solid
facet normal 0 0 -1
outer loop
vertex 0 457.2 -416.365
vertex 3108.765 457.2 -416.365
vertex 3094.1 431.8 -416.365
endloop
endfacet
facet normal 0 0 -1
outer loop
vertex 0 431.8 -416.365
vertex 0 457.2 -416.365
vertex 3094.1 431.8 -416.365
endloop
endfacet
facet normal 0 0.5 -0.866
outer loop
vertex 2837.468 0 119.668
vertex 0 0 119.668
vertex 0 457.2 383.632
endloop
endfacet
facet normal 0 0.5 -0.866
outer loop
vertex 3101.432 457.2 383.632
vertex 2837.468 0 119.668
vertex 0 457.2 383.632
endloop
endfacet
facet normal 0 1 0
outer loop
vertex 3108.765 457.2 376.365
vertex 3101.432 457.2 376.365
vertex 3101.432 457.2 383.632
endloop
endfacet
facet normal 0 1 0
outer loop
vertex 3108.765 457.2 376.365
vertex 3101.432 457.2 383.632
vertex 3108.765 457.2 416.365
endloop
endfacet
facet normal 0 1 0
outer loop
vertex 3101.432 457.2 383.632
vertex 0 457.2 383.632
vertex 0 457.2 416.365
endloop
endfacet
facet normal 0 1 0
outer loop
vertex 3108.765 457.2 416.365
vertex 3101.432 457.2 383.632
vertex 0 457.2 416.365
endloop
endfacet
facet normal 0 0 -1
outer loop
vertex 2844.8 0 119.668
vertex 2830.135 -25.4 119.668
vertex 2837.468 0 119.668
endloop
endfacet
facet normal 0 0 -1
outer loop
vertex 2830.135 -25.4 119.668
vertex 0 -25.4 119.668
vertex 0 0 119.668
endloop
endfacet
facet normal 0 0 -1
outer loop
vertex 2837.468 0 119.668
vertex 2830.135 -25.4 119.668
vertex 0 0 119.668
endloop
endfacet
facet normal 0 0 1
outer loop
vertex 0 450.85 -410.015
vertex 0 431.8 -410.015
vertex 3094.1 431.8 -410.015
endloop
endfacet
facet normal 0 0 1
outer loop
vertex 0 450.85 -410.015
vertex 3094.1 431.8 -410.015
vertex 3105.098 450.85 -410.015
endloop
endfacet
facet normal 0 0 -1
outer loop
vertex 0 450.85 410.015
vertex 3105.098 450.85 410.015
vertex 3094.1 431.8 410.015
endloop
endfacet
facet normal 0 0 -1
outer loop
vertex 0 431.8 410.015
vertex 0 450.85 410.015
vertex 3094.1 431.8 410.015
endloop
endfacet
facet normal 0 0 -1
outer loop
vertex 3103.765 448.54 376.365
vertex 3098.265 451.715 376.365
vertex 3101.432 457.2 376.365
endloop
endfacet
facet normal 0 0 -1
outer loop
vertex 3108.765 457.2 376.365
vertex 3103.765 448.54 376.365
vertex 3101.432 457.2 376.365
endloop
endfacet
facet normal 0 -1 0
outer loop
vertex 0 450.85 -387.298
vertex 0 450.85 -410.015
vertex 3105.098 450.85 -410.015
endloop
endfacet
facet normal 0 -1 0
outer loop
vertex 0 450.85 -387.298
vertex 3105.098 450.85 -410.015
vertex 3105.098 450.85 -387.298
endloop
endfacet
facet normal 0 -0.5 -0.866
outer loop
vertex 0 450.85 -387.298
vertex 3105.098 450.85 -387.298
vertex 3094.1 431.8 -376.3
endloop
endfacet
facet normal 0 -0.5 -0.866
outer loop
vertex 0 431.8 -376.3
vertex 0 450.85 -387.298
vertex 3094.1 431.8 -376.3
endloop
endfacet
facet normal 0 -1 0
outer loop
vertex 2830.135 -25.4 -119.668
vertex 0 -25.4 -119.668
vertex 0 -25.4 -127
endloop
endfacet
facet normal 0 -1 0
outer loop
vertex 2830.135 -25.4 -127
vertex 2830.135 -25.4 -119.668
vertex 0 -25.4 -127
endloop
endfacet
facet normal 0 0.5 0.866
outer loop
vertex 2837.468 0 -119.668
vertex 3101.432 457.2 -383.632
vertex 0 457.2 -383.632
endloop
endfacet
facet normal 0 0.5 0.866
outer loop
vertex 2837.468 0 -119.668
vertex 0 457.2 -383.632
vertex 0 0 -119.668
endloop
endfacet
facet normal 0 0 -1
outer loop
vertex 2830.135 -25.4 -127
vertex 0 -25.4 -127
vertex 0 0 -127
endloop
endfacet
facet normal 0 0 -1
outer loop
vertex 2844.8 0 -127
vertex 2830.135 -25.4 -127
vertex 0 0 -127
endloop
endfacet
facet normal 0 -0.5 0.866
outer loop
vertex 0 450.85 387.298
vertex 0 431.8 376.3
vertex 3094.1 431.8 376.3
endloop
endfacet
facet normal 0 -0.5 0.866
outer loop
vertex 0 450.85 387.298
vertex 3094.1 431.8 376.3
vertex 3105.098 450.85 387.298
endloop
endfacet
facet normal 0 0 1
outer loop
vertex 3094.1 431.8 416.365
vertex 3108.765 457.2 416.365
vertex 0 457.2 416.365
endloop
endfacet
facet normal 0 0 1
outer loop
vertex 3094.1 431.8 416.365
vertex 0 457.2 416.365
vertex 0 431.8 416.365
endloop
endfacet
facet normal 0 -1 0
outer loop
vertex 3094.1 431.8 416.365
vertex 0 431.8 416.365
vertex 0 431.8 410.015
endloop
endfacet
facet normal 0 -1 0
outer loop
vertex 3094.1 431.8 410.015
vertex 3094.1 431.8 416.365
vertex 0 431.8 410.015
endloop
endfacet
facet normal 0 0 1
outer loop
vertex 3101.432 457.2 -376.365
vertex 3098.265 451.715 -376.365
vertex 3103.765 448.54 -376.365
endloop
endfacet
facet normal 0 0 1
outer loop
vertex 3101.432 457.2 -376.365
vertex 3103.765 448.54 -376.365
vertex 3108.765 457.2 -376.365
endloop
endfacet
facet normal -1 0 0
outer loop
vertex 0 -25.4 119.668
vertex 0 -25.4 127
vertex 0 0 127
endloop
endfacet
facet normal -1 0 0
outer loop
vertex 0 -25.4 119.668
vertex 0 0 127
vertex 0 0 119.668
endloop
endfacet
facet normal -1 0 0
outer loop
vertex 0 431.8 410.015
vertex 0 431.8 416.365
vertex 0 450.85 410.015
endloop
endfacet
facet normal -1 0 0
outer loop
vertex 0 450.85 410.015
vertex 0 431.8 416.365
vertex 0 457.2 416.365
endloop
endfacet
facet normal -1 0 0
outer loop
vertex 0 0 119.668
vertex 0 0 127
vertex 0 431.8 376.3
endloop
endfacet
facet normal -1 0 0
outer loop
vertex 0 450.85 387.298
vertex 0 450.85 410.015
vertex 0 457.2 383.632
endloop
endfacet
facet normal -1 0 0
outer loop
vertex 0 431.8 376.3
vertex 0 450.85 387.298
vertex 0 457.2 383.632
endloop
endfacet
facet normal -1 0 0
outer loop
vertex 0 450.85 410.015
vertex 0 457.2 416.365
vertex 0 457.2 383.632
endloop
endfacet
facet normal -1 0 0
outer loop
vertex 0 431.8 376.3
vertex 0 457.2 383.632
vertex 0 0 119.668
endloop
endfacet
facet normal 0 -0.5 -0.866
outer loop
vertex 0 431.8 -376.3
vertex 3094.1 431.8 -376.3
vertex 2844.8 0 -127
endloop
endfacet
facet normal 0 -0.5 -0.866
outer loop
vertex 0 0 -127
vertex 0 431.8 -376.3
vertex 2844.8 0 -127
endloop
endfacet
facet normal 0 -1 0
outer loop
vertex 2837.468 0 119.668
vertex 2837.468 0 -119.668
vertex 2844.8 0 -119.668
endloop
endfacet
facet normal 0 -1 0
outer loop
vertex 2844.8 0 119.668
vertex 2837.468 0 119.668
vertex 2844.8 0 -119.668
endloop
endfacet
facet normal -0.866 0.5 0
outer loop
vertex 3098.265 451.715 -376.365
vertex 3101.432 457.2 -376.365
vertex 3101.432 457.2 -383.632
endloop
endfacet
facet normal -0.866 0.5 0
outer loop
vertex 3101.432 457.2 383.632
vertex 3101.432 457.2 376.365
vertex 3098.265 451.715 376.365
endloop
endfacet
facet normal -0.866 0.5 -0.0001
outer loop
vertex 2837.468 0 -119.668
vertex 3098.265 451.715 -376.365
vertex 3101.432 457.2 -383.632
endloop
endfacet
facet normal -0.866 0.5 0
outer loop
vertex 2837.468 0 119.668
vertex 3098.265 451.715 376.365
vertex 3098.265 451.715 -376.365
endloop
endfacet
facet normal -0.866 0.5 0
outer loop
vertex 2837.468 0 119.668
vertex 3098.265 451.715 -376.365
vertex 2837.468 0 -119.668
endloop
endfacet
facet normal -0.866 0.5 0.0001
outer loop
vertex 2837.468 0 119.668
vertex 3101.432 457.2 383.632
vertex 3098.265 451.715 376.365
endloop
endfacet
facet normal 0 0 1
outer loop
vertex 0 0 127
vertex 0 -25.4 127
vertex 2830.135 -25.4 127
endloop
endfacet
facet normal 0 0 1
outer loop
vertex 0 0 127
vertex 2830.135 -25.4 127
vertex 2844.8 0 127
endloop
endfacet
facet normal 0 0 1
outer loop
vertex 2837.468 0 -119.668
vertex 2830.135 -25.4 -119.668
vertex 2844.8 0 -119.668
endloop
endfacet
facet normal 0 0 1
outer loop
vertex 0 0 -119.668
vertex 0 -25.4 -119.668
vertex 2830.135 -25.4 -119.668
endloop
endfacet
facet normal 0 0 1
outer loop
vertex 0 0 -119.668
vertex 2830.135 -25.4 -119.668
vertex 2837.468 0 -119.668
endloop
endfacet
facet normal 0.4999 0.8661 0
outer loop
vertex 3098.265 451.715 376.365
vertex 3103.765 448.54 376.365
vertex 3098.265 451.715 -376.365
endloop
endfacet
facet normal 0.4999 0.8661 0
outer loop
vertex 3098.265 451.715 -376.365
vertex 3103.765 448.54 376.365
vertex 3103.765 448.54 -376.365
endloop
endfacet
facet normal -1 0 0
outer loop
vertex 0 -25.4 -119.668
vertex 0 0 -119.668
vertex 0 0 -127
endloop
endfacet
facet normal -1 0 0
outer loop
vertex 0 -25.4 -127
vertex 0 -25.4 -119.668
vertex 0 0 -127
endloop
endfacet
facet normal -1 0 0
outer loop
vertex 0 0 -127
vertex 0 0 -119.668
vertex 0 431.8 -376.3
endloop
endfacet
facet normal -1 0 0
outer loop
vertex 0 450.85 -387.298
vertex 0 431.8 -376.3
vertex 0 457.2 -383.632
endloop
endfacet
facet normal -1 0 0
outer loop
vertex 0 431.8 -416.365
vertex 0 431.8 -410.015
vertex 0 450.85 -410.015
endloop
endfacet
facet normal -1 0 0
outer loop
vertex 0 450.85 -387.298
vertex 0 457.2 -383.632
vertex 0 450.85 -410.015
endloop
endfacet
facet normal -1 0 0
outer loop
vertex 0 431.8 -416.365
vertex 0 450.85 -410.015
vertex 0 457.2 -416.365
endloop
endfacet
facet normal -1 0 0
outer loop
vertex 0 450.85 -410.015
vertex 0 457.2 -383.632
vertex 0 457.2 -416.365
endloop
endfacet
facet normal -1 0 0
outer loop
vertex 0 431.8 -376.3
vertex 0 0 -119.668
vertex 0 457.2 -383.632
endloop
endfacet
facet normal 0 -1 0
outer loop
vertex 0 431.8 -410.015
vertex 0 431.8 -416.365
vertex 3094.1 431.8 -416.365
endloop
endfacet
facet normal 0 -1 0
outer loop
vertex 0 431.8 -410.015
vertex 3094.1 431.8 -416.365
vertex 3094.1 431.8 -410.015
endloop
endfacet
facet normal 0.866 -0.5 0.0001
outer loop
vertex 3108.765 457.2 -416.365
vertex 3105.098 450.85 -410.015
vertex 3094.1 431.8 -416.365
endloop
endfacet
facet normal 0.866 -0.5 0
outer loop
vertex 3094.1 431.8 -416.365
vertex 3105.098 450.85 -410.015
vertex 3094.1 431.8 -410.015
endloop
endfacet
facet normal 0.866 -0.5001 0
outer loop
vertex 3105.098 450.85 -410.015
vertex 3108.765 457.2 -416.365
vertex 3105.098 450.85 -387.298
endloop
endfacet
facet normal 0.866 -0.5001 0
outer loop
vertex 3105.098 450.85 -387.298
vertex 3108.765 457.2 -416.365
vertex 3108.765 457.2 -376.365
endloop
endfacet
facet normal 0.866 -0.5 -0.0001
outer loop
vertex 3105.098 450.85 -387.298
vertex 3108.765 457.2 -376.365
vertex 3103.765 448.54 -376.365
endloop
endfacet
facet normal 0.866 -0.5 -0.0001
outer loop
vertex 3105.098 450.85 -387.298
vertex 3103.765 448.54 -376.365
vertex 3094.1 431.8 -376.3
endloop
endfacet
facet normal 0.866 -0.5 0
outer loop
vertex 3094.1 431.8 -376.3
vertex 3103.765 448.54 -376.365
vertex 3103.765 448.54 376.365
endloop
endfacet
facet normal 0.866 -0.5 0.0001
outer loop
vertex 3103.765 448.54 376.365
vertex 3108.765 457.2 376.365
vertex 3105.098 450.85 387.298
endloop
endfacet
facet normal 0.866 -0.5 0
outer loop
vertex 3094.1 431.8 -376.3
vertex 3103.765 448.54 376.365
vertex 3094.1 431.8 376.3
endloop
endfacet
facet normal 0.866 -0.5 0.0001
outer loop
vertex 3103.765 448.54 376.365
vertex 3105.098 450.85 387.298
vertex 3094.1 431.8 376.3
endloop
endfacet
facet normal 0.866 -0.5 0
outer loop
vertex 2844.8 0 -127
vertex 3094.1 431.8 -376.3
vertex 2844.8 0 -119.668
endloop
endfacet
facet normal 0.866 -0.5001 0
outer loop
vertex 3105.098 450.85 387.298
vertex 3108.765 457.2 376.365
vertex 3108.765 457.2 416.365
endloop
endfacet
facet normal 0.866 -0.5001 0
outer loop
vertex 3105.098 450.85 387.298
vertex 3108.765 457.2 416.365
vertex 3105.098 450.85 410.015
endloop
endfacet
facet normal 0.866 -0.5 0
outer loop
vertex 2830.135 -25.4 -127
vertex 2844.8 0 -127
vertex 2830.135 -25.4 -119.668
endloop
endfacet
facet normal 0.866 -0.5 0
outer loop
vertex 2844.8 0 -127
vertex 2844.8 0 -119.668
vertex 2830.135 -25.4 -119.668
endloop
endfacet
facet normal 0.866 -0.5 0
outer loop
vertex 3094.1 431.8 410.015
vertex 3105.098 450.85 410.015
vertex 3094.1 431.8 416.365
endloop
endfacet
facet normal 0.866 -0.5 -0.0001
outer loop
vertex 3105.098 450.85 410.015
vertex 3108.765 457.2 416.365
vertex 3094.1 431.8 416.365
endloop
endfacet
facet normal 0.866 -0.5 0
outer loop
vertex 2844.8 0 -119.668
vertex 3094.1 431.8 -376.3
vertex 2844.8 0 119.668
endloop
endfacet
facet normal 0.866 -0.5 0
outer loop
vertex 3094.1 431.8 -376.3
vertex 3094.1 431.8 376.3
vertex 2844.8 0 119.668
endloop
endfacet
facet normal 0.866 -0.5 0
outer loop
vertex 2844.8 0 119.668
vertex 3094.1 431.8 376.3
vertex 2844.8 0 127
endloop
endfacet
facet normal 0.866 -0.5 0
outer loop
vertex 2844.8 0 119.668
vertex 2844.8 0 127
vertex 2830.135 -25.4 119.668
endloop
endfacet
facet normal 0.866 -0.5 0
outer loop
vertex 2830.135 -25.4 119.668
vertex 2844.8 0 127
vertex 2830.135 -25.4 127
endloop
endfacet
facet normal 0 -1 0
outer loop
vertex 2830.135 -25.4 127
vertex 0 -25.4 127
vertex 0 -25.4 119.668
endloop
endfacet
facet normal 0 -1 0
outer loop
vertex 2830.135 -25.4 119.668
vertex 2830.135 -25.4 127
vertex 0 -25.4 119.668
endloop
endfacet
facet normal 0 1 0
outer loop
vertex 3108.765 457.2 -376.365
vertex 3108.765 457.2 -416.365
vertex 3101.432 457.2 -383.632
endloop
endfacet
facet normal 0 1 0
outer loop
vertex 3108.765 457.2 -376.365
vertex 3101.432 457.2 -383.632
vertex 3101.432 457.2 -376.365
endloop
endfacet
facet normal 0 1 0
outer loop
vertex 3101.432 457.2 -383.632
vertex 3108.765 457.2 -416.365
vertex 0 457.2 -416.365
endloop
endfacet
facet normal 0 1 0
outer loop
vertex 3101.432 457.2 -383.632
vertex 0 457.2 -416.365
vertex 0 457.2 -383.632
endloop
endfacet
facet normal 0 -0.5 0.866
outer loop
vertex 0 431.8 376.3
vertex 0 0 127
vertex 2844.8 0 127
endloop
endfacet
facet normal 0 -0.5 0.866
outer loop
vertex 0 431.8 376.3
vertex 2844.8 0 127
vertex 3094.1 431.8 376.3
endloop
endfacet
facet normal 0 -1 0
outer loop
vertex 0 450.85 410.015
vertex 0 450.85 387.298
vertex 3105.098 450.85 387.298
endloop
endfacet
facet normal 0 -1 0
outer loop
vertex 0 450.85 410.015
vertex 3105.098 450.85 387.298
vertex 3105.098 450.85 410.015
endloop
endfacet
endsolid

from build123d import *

# Parameters (mm, degrees)
CHUTE_CENTER_DEPTH         = 127
CHUTE_SIDES_REACH          = 3146.77
SHELL1_T                   = -6.35
BOSS_EXTRUDE3_REACH        = 3168.434
SHELL3_DEPTH               = 3105.098368864
BOSS_EXTRUDE4_REACH        = 3171.67
SHELL5_DEPTH               = 3105.098368864
SKETCH11_W                 = 752.729086146
SKETCH11_H                 = 10
CLOSED_END_RELIEF_DEPTH    = 10
LOWER_SUPPORT_FLANGE_REACH = 3171.67
SKETCH12_W                 = 7.332348419
SKETCH12_H                 = 25.4


# Read off the part's stored shape, not the designer's step: Shell3, Shell5
with BuildPart() as part:
    # Sketch1 → Chute Center (new, symmetric)
    with BuildSketch(Plane.XY):
        Polygon((0, 0), (2844.8, 0), (3108.764543073, 457.2), (0, 457.2), align=None)
    extrude(amount=CHUTE_CENTER_DEPTH, both=True)

    # Chute Sides: up to this plane
    chute_sides_end = Plane(origin=(2844.8, 0, 127), z_dir=(-0.8660254037844399, 0.49999999999999784, 0))
    # Sketch2 → Chute Sides (add, up to the surface)
    with BuildSketch(Plane.ZY, mode=Mode.PRIVATE) as chute_sides_sk1:
        Polygon((127, 0), (390.964543073, 457.2), (127, 457.2), align=None)
    chute_sides_tool1 = split(extrude(chute_sides_sk1.sketch, amount=-CHUTE_SIDES_REACH, mode=Mode.PRIVATE), bisect_by=chute_sides_end, keep=Keep.BOTH, mode=Mode.PRIVATE)
    add(chute_sides_tool1.solids().sort_by_distance((0, 304.8, 214.988181))[0])
    # Sketch2 → Chute Sides (add, up to the surface)
    with BuildSketch(Plane.ZY, mode=Mode.PRIVATE) as chute_sides_sk2:
        Polygon((-127, 457.2), (-390.964543073, 457.2), (-127, 0), align=None)
    chute_sides_tool2 = split(extrude(chute_sides_sk2.sketch, amount=-CHUTE_SIDES_REACH, mode=Mode.PRIVATE), bisect_by=chute_sides_end, keep=Keep.BOTH, mode=Mode.PRIVATE)
    add(chute_sides_tool2.solids().sort_by_distance((0, 304.8, -214.988181))[0])

    # Shell1
    shell1_openings = [part.faces().sort_by_distance(p)[0] for p in [
        (1554.382271537, 457.2, 0),
        (1422.4, 0, 0),
        (0, 267.432963474, 0),
    ]]
    offset(amount=SHELL1_T, openings=shell1_openings, kind=Kind.INTERSECTION)

    # Boss-Extrude3: up to this plane
    boss_extrude3_end = Plane(origin=(2844.8, 0, 127), z_dir=(-0.8660254037844399, 0.49999999999999784, 0))
    # Sketch6 → Boss-Extrude3 (add, up to the surface)
    with BuildSketch(Plane(origin=(0, 0, 0), x_dir=(0, 0, -1), z_dir=(1, 0, 0)), mode=Mode.PRIVATE) as boss_extrude3_sk1:
        Polygon((390.964543073, 457.2), (416.364543073, 457.2), (416.364543073, 431.8), (376.299846236, 431.8), align=None)
    boss_extrude3_tool1 = split(extrude(boss_extrude3_sk1.sketch, amount=BOSS_EXTRUDE3_REACH, mode=Mode.PRIVATE), bisect_by=boss_extrude3_end, keep=Keep.BOTH, mode=Mode.PRIVATE)
    add(boss_extrude3_tool1.solids().sort_by_distance((0, 443.551694, -399.724617))[0])

    # Shell3 outline → Shell3 (cut)
    with BuildSketch(Plane.YZ):
        Polygon((450.85, -410.014543073), (450.85, -387.298368864), (431.8, -376.299846236), (431.8, -410.014543073), align=None)
    extrude(amount=SHELL3_DEPTH, mode=Mode.SUBTRACT)

    # Boss-Extrude4: up to this plane
    boss_extrude4_end = Plane(origin=(2844.8, 0, 127), z_dir=(-0.8660254037844399, 0.49999999999999784, 0))
    # Sketch7 → Boss-Extrude4 (add, up to the surface)
    with BuildSketch(Plane(origin=(0, 0, 0), x_dir=(0, 0, -1), z_dir=(1, 0, 0)), mode=Mode.PRIVATE) as boss_extrude4_sk1:
        Polygon((-390.964543073, 457.2), (-416.364543073, 457.2), (-416.364543073, 431.8), (-376.299846236, 431.8), align=None)
    boss_extrude4_tool1 = split(extrude(boss_extrude4_sk1.sketch, amount=BOSS_EXTRUDE4_REACH, mode=Mode.PRIVATE), bisect_by=boss_extrude4_end, keep=Keep.BOTH, mode=Mode.PRIVATE)
    add(boss_extrude4_tool1.solids().sort_by_distance((0, 443.551694, 399.724617))[0])

    # Shell5 outline → Shell5 (cut)
    with BuildSketch(Plane.YZ):
        Polygon((450.85, 387.298368864), (450.85, 410.014543073), (431.8, 410.014543073), (431.8, 376.299846236), align=None)
    extrude(amount=SHELL5_DEPTH, mode=Mode.SUBTRACT)

    # Sketch11 → Closed End Relief (cut)
    with BuildSketch(Plane(origin=(2133.6, -1231.834534343, 0), x_dir=(0, 0, -1), z_dir=(0.86602540378444, -0.49999999999999784, 0))):
        with Locations((0, 1945.329086147)):
            Rectangle(SKETCH11_W, SKETCH11_H)
    extrude(amount=-CLOSED_END_RELIEF_DEPTH, mode=Mode.SUBTRACT)

    # Lower Support Flange: up to this plane
    lower_support_flange_end = Plane(origin=(2844.8, 0, 127), z_dir=(-0.8660254037844399, 0.49999999999999784, 0))
    # Sketch12 → Lower Support Flange (add, up to the surface)
    with BuildSketch(Plane(origin=(0, 0, 0), x_dir=(0, 0, -1), z_dir=(1, 0, 0)), mode=Mode.PRIVATE) as lower_support_flange_sk1:
        with Locations((123.333825791, -12.7)):
            Rectangle(SKETCH12_W, SKETCH12_H)
    lower_support_flange_tool1 = split(extrude(lower_support_flange_sk1.sketch, amount=LOWER_SUPPORT_FLANGE_REACH, mode=Mode.PRIVATE), bisect_by=lower_support_flange_end, keep=Keep.BOTH, mode=Mode.PRIVATE)
    add(lower_support_flange_tool1.solids().sort_by_distance((0, -12.7, -123.333826))[0])
    # Sketch12 → Lower Support Flange (add, up to the surface)
    with BuildSketch(Plane(origin=(0, 0, 0), x_dir=(0, 0, -1), z_dir=(1, 0, 0)), mode=Mode.PRIVATE) as lower_support_flange_sk2:
        with Locations((-123.333825791, -12.7)):
            Rectangle(SKETCH12_W, SKETCH12_H)
    lower_support_flange_tool2 = split(extrude(lower_support_flange_sk2.sketch, amount=LOWER_SUPPORT_FLANGE_REACH, mode=Mode.PRIVATE), bisect_by=lower_support_flange_end, keep=Keep.BOTH, mode=Mode.PRIVATE)
    add(lower_support_flange_tool2.solids().sort_by_distance((0, -12.7, 123.333826))[0])


solid = part.part
